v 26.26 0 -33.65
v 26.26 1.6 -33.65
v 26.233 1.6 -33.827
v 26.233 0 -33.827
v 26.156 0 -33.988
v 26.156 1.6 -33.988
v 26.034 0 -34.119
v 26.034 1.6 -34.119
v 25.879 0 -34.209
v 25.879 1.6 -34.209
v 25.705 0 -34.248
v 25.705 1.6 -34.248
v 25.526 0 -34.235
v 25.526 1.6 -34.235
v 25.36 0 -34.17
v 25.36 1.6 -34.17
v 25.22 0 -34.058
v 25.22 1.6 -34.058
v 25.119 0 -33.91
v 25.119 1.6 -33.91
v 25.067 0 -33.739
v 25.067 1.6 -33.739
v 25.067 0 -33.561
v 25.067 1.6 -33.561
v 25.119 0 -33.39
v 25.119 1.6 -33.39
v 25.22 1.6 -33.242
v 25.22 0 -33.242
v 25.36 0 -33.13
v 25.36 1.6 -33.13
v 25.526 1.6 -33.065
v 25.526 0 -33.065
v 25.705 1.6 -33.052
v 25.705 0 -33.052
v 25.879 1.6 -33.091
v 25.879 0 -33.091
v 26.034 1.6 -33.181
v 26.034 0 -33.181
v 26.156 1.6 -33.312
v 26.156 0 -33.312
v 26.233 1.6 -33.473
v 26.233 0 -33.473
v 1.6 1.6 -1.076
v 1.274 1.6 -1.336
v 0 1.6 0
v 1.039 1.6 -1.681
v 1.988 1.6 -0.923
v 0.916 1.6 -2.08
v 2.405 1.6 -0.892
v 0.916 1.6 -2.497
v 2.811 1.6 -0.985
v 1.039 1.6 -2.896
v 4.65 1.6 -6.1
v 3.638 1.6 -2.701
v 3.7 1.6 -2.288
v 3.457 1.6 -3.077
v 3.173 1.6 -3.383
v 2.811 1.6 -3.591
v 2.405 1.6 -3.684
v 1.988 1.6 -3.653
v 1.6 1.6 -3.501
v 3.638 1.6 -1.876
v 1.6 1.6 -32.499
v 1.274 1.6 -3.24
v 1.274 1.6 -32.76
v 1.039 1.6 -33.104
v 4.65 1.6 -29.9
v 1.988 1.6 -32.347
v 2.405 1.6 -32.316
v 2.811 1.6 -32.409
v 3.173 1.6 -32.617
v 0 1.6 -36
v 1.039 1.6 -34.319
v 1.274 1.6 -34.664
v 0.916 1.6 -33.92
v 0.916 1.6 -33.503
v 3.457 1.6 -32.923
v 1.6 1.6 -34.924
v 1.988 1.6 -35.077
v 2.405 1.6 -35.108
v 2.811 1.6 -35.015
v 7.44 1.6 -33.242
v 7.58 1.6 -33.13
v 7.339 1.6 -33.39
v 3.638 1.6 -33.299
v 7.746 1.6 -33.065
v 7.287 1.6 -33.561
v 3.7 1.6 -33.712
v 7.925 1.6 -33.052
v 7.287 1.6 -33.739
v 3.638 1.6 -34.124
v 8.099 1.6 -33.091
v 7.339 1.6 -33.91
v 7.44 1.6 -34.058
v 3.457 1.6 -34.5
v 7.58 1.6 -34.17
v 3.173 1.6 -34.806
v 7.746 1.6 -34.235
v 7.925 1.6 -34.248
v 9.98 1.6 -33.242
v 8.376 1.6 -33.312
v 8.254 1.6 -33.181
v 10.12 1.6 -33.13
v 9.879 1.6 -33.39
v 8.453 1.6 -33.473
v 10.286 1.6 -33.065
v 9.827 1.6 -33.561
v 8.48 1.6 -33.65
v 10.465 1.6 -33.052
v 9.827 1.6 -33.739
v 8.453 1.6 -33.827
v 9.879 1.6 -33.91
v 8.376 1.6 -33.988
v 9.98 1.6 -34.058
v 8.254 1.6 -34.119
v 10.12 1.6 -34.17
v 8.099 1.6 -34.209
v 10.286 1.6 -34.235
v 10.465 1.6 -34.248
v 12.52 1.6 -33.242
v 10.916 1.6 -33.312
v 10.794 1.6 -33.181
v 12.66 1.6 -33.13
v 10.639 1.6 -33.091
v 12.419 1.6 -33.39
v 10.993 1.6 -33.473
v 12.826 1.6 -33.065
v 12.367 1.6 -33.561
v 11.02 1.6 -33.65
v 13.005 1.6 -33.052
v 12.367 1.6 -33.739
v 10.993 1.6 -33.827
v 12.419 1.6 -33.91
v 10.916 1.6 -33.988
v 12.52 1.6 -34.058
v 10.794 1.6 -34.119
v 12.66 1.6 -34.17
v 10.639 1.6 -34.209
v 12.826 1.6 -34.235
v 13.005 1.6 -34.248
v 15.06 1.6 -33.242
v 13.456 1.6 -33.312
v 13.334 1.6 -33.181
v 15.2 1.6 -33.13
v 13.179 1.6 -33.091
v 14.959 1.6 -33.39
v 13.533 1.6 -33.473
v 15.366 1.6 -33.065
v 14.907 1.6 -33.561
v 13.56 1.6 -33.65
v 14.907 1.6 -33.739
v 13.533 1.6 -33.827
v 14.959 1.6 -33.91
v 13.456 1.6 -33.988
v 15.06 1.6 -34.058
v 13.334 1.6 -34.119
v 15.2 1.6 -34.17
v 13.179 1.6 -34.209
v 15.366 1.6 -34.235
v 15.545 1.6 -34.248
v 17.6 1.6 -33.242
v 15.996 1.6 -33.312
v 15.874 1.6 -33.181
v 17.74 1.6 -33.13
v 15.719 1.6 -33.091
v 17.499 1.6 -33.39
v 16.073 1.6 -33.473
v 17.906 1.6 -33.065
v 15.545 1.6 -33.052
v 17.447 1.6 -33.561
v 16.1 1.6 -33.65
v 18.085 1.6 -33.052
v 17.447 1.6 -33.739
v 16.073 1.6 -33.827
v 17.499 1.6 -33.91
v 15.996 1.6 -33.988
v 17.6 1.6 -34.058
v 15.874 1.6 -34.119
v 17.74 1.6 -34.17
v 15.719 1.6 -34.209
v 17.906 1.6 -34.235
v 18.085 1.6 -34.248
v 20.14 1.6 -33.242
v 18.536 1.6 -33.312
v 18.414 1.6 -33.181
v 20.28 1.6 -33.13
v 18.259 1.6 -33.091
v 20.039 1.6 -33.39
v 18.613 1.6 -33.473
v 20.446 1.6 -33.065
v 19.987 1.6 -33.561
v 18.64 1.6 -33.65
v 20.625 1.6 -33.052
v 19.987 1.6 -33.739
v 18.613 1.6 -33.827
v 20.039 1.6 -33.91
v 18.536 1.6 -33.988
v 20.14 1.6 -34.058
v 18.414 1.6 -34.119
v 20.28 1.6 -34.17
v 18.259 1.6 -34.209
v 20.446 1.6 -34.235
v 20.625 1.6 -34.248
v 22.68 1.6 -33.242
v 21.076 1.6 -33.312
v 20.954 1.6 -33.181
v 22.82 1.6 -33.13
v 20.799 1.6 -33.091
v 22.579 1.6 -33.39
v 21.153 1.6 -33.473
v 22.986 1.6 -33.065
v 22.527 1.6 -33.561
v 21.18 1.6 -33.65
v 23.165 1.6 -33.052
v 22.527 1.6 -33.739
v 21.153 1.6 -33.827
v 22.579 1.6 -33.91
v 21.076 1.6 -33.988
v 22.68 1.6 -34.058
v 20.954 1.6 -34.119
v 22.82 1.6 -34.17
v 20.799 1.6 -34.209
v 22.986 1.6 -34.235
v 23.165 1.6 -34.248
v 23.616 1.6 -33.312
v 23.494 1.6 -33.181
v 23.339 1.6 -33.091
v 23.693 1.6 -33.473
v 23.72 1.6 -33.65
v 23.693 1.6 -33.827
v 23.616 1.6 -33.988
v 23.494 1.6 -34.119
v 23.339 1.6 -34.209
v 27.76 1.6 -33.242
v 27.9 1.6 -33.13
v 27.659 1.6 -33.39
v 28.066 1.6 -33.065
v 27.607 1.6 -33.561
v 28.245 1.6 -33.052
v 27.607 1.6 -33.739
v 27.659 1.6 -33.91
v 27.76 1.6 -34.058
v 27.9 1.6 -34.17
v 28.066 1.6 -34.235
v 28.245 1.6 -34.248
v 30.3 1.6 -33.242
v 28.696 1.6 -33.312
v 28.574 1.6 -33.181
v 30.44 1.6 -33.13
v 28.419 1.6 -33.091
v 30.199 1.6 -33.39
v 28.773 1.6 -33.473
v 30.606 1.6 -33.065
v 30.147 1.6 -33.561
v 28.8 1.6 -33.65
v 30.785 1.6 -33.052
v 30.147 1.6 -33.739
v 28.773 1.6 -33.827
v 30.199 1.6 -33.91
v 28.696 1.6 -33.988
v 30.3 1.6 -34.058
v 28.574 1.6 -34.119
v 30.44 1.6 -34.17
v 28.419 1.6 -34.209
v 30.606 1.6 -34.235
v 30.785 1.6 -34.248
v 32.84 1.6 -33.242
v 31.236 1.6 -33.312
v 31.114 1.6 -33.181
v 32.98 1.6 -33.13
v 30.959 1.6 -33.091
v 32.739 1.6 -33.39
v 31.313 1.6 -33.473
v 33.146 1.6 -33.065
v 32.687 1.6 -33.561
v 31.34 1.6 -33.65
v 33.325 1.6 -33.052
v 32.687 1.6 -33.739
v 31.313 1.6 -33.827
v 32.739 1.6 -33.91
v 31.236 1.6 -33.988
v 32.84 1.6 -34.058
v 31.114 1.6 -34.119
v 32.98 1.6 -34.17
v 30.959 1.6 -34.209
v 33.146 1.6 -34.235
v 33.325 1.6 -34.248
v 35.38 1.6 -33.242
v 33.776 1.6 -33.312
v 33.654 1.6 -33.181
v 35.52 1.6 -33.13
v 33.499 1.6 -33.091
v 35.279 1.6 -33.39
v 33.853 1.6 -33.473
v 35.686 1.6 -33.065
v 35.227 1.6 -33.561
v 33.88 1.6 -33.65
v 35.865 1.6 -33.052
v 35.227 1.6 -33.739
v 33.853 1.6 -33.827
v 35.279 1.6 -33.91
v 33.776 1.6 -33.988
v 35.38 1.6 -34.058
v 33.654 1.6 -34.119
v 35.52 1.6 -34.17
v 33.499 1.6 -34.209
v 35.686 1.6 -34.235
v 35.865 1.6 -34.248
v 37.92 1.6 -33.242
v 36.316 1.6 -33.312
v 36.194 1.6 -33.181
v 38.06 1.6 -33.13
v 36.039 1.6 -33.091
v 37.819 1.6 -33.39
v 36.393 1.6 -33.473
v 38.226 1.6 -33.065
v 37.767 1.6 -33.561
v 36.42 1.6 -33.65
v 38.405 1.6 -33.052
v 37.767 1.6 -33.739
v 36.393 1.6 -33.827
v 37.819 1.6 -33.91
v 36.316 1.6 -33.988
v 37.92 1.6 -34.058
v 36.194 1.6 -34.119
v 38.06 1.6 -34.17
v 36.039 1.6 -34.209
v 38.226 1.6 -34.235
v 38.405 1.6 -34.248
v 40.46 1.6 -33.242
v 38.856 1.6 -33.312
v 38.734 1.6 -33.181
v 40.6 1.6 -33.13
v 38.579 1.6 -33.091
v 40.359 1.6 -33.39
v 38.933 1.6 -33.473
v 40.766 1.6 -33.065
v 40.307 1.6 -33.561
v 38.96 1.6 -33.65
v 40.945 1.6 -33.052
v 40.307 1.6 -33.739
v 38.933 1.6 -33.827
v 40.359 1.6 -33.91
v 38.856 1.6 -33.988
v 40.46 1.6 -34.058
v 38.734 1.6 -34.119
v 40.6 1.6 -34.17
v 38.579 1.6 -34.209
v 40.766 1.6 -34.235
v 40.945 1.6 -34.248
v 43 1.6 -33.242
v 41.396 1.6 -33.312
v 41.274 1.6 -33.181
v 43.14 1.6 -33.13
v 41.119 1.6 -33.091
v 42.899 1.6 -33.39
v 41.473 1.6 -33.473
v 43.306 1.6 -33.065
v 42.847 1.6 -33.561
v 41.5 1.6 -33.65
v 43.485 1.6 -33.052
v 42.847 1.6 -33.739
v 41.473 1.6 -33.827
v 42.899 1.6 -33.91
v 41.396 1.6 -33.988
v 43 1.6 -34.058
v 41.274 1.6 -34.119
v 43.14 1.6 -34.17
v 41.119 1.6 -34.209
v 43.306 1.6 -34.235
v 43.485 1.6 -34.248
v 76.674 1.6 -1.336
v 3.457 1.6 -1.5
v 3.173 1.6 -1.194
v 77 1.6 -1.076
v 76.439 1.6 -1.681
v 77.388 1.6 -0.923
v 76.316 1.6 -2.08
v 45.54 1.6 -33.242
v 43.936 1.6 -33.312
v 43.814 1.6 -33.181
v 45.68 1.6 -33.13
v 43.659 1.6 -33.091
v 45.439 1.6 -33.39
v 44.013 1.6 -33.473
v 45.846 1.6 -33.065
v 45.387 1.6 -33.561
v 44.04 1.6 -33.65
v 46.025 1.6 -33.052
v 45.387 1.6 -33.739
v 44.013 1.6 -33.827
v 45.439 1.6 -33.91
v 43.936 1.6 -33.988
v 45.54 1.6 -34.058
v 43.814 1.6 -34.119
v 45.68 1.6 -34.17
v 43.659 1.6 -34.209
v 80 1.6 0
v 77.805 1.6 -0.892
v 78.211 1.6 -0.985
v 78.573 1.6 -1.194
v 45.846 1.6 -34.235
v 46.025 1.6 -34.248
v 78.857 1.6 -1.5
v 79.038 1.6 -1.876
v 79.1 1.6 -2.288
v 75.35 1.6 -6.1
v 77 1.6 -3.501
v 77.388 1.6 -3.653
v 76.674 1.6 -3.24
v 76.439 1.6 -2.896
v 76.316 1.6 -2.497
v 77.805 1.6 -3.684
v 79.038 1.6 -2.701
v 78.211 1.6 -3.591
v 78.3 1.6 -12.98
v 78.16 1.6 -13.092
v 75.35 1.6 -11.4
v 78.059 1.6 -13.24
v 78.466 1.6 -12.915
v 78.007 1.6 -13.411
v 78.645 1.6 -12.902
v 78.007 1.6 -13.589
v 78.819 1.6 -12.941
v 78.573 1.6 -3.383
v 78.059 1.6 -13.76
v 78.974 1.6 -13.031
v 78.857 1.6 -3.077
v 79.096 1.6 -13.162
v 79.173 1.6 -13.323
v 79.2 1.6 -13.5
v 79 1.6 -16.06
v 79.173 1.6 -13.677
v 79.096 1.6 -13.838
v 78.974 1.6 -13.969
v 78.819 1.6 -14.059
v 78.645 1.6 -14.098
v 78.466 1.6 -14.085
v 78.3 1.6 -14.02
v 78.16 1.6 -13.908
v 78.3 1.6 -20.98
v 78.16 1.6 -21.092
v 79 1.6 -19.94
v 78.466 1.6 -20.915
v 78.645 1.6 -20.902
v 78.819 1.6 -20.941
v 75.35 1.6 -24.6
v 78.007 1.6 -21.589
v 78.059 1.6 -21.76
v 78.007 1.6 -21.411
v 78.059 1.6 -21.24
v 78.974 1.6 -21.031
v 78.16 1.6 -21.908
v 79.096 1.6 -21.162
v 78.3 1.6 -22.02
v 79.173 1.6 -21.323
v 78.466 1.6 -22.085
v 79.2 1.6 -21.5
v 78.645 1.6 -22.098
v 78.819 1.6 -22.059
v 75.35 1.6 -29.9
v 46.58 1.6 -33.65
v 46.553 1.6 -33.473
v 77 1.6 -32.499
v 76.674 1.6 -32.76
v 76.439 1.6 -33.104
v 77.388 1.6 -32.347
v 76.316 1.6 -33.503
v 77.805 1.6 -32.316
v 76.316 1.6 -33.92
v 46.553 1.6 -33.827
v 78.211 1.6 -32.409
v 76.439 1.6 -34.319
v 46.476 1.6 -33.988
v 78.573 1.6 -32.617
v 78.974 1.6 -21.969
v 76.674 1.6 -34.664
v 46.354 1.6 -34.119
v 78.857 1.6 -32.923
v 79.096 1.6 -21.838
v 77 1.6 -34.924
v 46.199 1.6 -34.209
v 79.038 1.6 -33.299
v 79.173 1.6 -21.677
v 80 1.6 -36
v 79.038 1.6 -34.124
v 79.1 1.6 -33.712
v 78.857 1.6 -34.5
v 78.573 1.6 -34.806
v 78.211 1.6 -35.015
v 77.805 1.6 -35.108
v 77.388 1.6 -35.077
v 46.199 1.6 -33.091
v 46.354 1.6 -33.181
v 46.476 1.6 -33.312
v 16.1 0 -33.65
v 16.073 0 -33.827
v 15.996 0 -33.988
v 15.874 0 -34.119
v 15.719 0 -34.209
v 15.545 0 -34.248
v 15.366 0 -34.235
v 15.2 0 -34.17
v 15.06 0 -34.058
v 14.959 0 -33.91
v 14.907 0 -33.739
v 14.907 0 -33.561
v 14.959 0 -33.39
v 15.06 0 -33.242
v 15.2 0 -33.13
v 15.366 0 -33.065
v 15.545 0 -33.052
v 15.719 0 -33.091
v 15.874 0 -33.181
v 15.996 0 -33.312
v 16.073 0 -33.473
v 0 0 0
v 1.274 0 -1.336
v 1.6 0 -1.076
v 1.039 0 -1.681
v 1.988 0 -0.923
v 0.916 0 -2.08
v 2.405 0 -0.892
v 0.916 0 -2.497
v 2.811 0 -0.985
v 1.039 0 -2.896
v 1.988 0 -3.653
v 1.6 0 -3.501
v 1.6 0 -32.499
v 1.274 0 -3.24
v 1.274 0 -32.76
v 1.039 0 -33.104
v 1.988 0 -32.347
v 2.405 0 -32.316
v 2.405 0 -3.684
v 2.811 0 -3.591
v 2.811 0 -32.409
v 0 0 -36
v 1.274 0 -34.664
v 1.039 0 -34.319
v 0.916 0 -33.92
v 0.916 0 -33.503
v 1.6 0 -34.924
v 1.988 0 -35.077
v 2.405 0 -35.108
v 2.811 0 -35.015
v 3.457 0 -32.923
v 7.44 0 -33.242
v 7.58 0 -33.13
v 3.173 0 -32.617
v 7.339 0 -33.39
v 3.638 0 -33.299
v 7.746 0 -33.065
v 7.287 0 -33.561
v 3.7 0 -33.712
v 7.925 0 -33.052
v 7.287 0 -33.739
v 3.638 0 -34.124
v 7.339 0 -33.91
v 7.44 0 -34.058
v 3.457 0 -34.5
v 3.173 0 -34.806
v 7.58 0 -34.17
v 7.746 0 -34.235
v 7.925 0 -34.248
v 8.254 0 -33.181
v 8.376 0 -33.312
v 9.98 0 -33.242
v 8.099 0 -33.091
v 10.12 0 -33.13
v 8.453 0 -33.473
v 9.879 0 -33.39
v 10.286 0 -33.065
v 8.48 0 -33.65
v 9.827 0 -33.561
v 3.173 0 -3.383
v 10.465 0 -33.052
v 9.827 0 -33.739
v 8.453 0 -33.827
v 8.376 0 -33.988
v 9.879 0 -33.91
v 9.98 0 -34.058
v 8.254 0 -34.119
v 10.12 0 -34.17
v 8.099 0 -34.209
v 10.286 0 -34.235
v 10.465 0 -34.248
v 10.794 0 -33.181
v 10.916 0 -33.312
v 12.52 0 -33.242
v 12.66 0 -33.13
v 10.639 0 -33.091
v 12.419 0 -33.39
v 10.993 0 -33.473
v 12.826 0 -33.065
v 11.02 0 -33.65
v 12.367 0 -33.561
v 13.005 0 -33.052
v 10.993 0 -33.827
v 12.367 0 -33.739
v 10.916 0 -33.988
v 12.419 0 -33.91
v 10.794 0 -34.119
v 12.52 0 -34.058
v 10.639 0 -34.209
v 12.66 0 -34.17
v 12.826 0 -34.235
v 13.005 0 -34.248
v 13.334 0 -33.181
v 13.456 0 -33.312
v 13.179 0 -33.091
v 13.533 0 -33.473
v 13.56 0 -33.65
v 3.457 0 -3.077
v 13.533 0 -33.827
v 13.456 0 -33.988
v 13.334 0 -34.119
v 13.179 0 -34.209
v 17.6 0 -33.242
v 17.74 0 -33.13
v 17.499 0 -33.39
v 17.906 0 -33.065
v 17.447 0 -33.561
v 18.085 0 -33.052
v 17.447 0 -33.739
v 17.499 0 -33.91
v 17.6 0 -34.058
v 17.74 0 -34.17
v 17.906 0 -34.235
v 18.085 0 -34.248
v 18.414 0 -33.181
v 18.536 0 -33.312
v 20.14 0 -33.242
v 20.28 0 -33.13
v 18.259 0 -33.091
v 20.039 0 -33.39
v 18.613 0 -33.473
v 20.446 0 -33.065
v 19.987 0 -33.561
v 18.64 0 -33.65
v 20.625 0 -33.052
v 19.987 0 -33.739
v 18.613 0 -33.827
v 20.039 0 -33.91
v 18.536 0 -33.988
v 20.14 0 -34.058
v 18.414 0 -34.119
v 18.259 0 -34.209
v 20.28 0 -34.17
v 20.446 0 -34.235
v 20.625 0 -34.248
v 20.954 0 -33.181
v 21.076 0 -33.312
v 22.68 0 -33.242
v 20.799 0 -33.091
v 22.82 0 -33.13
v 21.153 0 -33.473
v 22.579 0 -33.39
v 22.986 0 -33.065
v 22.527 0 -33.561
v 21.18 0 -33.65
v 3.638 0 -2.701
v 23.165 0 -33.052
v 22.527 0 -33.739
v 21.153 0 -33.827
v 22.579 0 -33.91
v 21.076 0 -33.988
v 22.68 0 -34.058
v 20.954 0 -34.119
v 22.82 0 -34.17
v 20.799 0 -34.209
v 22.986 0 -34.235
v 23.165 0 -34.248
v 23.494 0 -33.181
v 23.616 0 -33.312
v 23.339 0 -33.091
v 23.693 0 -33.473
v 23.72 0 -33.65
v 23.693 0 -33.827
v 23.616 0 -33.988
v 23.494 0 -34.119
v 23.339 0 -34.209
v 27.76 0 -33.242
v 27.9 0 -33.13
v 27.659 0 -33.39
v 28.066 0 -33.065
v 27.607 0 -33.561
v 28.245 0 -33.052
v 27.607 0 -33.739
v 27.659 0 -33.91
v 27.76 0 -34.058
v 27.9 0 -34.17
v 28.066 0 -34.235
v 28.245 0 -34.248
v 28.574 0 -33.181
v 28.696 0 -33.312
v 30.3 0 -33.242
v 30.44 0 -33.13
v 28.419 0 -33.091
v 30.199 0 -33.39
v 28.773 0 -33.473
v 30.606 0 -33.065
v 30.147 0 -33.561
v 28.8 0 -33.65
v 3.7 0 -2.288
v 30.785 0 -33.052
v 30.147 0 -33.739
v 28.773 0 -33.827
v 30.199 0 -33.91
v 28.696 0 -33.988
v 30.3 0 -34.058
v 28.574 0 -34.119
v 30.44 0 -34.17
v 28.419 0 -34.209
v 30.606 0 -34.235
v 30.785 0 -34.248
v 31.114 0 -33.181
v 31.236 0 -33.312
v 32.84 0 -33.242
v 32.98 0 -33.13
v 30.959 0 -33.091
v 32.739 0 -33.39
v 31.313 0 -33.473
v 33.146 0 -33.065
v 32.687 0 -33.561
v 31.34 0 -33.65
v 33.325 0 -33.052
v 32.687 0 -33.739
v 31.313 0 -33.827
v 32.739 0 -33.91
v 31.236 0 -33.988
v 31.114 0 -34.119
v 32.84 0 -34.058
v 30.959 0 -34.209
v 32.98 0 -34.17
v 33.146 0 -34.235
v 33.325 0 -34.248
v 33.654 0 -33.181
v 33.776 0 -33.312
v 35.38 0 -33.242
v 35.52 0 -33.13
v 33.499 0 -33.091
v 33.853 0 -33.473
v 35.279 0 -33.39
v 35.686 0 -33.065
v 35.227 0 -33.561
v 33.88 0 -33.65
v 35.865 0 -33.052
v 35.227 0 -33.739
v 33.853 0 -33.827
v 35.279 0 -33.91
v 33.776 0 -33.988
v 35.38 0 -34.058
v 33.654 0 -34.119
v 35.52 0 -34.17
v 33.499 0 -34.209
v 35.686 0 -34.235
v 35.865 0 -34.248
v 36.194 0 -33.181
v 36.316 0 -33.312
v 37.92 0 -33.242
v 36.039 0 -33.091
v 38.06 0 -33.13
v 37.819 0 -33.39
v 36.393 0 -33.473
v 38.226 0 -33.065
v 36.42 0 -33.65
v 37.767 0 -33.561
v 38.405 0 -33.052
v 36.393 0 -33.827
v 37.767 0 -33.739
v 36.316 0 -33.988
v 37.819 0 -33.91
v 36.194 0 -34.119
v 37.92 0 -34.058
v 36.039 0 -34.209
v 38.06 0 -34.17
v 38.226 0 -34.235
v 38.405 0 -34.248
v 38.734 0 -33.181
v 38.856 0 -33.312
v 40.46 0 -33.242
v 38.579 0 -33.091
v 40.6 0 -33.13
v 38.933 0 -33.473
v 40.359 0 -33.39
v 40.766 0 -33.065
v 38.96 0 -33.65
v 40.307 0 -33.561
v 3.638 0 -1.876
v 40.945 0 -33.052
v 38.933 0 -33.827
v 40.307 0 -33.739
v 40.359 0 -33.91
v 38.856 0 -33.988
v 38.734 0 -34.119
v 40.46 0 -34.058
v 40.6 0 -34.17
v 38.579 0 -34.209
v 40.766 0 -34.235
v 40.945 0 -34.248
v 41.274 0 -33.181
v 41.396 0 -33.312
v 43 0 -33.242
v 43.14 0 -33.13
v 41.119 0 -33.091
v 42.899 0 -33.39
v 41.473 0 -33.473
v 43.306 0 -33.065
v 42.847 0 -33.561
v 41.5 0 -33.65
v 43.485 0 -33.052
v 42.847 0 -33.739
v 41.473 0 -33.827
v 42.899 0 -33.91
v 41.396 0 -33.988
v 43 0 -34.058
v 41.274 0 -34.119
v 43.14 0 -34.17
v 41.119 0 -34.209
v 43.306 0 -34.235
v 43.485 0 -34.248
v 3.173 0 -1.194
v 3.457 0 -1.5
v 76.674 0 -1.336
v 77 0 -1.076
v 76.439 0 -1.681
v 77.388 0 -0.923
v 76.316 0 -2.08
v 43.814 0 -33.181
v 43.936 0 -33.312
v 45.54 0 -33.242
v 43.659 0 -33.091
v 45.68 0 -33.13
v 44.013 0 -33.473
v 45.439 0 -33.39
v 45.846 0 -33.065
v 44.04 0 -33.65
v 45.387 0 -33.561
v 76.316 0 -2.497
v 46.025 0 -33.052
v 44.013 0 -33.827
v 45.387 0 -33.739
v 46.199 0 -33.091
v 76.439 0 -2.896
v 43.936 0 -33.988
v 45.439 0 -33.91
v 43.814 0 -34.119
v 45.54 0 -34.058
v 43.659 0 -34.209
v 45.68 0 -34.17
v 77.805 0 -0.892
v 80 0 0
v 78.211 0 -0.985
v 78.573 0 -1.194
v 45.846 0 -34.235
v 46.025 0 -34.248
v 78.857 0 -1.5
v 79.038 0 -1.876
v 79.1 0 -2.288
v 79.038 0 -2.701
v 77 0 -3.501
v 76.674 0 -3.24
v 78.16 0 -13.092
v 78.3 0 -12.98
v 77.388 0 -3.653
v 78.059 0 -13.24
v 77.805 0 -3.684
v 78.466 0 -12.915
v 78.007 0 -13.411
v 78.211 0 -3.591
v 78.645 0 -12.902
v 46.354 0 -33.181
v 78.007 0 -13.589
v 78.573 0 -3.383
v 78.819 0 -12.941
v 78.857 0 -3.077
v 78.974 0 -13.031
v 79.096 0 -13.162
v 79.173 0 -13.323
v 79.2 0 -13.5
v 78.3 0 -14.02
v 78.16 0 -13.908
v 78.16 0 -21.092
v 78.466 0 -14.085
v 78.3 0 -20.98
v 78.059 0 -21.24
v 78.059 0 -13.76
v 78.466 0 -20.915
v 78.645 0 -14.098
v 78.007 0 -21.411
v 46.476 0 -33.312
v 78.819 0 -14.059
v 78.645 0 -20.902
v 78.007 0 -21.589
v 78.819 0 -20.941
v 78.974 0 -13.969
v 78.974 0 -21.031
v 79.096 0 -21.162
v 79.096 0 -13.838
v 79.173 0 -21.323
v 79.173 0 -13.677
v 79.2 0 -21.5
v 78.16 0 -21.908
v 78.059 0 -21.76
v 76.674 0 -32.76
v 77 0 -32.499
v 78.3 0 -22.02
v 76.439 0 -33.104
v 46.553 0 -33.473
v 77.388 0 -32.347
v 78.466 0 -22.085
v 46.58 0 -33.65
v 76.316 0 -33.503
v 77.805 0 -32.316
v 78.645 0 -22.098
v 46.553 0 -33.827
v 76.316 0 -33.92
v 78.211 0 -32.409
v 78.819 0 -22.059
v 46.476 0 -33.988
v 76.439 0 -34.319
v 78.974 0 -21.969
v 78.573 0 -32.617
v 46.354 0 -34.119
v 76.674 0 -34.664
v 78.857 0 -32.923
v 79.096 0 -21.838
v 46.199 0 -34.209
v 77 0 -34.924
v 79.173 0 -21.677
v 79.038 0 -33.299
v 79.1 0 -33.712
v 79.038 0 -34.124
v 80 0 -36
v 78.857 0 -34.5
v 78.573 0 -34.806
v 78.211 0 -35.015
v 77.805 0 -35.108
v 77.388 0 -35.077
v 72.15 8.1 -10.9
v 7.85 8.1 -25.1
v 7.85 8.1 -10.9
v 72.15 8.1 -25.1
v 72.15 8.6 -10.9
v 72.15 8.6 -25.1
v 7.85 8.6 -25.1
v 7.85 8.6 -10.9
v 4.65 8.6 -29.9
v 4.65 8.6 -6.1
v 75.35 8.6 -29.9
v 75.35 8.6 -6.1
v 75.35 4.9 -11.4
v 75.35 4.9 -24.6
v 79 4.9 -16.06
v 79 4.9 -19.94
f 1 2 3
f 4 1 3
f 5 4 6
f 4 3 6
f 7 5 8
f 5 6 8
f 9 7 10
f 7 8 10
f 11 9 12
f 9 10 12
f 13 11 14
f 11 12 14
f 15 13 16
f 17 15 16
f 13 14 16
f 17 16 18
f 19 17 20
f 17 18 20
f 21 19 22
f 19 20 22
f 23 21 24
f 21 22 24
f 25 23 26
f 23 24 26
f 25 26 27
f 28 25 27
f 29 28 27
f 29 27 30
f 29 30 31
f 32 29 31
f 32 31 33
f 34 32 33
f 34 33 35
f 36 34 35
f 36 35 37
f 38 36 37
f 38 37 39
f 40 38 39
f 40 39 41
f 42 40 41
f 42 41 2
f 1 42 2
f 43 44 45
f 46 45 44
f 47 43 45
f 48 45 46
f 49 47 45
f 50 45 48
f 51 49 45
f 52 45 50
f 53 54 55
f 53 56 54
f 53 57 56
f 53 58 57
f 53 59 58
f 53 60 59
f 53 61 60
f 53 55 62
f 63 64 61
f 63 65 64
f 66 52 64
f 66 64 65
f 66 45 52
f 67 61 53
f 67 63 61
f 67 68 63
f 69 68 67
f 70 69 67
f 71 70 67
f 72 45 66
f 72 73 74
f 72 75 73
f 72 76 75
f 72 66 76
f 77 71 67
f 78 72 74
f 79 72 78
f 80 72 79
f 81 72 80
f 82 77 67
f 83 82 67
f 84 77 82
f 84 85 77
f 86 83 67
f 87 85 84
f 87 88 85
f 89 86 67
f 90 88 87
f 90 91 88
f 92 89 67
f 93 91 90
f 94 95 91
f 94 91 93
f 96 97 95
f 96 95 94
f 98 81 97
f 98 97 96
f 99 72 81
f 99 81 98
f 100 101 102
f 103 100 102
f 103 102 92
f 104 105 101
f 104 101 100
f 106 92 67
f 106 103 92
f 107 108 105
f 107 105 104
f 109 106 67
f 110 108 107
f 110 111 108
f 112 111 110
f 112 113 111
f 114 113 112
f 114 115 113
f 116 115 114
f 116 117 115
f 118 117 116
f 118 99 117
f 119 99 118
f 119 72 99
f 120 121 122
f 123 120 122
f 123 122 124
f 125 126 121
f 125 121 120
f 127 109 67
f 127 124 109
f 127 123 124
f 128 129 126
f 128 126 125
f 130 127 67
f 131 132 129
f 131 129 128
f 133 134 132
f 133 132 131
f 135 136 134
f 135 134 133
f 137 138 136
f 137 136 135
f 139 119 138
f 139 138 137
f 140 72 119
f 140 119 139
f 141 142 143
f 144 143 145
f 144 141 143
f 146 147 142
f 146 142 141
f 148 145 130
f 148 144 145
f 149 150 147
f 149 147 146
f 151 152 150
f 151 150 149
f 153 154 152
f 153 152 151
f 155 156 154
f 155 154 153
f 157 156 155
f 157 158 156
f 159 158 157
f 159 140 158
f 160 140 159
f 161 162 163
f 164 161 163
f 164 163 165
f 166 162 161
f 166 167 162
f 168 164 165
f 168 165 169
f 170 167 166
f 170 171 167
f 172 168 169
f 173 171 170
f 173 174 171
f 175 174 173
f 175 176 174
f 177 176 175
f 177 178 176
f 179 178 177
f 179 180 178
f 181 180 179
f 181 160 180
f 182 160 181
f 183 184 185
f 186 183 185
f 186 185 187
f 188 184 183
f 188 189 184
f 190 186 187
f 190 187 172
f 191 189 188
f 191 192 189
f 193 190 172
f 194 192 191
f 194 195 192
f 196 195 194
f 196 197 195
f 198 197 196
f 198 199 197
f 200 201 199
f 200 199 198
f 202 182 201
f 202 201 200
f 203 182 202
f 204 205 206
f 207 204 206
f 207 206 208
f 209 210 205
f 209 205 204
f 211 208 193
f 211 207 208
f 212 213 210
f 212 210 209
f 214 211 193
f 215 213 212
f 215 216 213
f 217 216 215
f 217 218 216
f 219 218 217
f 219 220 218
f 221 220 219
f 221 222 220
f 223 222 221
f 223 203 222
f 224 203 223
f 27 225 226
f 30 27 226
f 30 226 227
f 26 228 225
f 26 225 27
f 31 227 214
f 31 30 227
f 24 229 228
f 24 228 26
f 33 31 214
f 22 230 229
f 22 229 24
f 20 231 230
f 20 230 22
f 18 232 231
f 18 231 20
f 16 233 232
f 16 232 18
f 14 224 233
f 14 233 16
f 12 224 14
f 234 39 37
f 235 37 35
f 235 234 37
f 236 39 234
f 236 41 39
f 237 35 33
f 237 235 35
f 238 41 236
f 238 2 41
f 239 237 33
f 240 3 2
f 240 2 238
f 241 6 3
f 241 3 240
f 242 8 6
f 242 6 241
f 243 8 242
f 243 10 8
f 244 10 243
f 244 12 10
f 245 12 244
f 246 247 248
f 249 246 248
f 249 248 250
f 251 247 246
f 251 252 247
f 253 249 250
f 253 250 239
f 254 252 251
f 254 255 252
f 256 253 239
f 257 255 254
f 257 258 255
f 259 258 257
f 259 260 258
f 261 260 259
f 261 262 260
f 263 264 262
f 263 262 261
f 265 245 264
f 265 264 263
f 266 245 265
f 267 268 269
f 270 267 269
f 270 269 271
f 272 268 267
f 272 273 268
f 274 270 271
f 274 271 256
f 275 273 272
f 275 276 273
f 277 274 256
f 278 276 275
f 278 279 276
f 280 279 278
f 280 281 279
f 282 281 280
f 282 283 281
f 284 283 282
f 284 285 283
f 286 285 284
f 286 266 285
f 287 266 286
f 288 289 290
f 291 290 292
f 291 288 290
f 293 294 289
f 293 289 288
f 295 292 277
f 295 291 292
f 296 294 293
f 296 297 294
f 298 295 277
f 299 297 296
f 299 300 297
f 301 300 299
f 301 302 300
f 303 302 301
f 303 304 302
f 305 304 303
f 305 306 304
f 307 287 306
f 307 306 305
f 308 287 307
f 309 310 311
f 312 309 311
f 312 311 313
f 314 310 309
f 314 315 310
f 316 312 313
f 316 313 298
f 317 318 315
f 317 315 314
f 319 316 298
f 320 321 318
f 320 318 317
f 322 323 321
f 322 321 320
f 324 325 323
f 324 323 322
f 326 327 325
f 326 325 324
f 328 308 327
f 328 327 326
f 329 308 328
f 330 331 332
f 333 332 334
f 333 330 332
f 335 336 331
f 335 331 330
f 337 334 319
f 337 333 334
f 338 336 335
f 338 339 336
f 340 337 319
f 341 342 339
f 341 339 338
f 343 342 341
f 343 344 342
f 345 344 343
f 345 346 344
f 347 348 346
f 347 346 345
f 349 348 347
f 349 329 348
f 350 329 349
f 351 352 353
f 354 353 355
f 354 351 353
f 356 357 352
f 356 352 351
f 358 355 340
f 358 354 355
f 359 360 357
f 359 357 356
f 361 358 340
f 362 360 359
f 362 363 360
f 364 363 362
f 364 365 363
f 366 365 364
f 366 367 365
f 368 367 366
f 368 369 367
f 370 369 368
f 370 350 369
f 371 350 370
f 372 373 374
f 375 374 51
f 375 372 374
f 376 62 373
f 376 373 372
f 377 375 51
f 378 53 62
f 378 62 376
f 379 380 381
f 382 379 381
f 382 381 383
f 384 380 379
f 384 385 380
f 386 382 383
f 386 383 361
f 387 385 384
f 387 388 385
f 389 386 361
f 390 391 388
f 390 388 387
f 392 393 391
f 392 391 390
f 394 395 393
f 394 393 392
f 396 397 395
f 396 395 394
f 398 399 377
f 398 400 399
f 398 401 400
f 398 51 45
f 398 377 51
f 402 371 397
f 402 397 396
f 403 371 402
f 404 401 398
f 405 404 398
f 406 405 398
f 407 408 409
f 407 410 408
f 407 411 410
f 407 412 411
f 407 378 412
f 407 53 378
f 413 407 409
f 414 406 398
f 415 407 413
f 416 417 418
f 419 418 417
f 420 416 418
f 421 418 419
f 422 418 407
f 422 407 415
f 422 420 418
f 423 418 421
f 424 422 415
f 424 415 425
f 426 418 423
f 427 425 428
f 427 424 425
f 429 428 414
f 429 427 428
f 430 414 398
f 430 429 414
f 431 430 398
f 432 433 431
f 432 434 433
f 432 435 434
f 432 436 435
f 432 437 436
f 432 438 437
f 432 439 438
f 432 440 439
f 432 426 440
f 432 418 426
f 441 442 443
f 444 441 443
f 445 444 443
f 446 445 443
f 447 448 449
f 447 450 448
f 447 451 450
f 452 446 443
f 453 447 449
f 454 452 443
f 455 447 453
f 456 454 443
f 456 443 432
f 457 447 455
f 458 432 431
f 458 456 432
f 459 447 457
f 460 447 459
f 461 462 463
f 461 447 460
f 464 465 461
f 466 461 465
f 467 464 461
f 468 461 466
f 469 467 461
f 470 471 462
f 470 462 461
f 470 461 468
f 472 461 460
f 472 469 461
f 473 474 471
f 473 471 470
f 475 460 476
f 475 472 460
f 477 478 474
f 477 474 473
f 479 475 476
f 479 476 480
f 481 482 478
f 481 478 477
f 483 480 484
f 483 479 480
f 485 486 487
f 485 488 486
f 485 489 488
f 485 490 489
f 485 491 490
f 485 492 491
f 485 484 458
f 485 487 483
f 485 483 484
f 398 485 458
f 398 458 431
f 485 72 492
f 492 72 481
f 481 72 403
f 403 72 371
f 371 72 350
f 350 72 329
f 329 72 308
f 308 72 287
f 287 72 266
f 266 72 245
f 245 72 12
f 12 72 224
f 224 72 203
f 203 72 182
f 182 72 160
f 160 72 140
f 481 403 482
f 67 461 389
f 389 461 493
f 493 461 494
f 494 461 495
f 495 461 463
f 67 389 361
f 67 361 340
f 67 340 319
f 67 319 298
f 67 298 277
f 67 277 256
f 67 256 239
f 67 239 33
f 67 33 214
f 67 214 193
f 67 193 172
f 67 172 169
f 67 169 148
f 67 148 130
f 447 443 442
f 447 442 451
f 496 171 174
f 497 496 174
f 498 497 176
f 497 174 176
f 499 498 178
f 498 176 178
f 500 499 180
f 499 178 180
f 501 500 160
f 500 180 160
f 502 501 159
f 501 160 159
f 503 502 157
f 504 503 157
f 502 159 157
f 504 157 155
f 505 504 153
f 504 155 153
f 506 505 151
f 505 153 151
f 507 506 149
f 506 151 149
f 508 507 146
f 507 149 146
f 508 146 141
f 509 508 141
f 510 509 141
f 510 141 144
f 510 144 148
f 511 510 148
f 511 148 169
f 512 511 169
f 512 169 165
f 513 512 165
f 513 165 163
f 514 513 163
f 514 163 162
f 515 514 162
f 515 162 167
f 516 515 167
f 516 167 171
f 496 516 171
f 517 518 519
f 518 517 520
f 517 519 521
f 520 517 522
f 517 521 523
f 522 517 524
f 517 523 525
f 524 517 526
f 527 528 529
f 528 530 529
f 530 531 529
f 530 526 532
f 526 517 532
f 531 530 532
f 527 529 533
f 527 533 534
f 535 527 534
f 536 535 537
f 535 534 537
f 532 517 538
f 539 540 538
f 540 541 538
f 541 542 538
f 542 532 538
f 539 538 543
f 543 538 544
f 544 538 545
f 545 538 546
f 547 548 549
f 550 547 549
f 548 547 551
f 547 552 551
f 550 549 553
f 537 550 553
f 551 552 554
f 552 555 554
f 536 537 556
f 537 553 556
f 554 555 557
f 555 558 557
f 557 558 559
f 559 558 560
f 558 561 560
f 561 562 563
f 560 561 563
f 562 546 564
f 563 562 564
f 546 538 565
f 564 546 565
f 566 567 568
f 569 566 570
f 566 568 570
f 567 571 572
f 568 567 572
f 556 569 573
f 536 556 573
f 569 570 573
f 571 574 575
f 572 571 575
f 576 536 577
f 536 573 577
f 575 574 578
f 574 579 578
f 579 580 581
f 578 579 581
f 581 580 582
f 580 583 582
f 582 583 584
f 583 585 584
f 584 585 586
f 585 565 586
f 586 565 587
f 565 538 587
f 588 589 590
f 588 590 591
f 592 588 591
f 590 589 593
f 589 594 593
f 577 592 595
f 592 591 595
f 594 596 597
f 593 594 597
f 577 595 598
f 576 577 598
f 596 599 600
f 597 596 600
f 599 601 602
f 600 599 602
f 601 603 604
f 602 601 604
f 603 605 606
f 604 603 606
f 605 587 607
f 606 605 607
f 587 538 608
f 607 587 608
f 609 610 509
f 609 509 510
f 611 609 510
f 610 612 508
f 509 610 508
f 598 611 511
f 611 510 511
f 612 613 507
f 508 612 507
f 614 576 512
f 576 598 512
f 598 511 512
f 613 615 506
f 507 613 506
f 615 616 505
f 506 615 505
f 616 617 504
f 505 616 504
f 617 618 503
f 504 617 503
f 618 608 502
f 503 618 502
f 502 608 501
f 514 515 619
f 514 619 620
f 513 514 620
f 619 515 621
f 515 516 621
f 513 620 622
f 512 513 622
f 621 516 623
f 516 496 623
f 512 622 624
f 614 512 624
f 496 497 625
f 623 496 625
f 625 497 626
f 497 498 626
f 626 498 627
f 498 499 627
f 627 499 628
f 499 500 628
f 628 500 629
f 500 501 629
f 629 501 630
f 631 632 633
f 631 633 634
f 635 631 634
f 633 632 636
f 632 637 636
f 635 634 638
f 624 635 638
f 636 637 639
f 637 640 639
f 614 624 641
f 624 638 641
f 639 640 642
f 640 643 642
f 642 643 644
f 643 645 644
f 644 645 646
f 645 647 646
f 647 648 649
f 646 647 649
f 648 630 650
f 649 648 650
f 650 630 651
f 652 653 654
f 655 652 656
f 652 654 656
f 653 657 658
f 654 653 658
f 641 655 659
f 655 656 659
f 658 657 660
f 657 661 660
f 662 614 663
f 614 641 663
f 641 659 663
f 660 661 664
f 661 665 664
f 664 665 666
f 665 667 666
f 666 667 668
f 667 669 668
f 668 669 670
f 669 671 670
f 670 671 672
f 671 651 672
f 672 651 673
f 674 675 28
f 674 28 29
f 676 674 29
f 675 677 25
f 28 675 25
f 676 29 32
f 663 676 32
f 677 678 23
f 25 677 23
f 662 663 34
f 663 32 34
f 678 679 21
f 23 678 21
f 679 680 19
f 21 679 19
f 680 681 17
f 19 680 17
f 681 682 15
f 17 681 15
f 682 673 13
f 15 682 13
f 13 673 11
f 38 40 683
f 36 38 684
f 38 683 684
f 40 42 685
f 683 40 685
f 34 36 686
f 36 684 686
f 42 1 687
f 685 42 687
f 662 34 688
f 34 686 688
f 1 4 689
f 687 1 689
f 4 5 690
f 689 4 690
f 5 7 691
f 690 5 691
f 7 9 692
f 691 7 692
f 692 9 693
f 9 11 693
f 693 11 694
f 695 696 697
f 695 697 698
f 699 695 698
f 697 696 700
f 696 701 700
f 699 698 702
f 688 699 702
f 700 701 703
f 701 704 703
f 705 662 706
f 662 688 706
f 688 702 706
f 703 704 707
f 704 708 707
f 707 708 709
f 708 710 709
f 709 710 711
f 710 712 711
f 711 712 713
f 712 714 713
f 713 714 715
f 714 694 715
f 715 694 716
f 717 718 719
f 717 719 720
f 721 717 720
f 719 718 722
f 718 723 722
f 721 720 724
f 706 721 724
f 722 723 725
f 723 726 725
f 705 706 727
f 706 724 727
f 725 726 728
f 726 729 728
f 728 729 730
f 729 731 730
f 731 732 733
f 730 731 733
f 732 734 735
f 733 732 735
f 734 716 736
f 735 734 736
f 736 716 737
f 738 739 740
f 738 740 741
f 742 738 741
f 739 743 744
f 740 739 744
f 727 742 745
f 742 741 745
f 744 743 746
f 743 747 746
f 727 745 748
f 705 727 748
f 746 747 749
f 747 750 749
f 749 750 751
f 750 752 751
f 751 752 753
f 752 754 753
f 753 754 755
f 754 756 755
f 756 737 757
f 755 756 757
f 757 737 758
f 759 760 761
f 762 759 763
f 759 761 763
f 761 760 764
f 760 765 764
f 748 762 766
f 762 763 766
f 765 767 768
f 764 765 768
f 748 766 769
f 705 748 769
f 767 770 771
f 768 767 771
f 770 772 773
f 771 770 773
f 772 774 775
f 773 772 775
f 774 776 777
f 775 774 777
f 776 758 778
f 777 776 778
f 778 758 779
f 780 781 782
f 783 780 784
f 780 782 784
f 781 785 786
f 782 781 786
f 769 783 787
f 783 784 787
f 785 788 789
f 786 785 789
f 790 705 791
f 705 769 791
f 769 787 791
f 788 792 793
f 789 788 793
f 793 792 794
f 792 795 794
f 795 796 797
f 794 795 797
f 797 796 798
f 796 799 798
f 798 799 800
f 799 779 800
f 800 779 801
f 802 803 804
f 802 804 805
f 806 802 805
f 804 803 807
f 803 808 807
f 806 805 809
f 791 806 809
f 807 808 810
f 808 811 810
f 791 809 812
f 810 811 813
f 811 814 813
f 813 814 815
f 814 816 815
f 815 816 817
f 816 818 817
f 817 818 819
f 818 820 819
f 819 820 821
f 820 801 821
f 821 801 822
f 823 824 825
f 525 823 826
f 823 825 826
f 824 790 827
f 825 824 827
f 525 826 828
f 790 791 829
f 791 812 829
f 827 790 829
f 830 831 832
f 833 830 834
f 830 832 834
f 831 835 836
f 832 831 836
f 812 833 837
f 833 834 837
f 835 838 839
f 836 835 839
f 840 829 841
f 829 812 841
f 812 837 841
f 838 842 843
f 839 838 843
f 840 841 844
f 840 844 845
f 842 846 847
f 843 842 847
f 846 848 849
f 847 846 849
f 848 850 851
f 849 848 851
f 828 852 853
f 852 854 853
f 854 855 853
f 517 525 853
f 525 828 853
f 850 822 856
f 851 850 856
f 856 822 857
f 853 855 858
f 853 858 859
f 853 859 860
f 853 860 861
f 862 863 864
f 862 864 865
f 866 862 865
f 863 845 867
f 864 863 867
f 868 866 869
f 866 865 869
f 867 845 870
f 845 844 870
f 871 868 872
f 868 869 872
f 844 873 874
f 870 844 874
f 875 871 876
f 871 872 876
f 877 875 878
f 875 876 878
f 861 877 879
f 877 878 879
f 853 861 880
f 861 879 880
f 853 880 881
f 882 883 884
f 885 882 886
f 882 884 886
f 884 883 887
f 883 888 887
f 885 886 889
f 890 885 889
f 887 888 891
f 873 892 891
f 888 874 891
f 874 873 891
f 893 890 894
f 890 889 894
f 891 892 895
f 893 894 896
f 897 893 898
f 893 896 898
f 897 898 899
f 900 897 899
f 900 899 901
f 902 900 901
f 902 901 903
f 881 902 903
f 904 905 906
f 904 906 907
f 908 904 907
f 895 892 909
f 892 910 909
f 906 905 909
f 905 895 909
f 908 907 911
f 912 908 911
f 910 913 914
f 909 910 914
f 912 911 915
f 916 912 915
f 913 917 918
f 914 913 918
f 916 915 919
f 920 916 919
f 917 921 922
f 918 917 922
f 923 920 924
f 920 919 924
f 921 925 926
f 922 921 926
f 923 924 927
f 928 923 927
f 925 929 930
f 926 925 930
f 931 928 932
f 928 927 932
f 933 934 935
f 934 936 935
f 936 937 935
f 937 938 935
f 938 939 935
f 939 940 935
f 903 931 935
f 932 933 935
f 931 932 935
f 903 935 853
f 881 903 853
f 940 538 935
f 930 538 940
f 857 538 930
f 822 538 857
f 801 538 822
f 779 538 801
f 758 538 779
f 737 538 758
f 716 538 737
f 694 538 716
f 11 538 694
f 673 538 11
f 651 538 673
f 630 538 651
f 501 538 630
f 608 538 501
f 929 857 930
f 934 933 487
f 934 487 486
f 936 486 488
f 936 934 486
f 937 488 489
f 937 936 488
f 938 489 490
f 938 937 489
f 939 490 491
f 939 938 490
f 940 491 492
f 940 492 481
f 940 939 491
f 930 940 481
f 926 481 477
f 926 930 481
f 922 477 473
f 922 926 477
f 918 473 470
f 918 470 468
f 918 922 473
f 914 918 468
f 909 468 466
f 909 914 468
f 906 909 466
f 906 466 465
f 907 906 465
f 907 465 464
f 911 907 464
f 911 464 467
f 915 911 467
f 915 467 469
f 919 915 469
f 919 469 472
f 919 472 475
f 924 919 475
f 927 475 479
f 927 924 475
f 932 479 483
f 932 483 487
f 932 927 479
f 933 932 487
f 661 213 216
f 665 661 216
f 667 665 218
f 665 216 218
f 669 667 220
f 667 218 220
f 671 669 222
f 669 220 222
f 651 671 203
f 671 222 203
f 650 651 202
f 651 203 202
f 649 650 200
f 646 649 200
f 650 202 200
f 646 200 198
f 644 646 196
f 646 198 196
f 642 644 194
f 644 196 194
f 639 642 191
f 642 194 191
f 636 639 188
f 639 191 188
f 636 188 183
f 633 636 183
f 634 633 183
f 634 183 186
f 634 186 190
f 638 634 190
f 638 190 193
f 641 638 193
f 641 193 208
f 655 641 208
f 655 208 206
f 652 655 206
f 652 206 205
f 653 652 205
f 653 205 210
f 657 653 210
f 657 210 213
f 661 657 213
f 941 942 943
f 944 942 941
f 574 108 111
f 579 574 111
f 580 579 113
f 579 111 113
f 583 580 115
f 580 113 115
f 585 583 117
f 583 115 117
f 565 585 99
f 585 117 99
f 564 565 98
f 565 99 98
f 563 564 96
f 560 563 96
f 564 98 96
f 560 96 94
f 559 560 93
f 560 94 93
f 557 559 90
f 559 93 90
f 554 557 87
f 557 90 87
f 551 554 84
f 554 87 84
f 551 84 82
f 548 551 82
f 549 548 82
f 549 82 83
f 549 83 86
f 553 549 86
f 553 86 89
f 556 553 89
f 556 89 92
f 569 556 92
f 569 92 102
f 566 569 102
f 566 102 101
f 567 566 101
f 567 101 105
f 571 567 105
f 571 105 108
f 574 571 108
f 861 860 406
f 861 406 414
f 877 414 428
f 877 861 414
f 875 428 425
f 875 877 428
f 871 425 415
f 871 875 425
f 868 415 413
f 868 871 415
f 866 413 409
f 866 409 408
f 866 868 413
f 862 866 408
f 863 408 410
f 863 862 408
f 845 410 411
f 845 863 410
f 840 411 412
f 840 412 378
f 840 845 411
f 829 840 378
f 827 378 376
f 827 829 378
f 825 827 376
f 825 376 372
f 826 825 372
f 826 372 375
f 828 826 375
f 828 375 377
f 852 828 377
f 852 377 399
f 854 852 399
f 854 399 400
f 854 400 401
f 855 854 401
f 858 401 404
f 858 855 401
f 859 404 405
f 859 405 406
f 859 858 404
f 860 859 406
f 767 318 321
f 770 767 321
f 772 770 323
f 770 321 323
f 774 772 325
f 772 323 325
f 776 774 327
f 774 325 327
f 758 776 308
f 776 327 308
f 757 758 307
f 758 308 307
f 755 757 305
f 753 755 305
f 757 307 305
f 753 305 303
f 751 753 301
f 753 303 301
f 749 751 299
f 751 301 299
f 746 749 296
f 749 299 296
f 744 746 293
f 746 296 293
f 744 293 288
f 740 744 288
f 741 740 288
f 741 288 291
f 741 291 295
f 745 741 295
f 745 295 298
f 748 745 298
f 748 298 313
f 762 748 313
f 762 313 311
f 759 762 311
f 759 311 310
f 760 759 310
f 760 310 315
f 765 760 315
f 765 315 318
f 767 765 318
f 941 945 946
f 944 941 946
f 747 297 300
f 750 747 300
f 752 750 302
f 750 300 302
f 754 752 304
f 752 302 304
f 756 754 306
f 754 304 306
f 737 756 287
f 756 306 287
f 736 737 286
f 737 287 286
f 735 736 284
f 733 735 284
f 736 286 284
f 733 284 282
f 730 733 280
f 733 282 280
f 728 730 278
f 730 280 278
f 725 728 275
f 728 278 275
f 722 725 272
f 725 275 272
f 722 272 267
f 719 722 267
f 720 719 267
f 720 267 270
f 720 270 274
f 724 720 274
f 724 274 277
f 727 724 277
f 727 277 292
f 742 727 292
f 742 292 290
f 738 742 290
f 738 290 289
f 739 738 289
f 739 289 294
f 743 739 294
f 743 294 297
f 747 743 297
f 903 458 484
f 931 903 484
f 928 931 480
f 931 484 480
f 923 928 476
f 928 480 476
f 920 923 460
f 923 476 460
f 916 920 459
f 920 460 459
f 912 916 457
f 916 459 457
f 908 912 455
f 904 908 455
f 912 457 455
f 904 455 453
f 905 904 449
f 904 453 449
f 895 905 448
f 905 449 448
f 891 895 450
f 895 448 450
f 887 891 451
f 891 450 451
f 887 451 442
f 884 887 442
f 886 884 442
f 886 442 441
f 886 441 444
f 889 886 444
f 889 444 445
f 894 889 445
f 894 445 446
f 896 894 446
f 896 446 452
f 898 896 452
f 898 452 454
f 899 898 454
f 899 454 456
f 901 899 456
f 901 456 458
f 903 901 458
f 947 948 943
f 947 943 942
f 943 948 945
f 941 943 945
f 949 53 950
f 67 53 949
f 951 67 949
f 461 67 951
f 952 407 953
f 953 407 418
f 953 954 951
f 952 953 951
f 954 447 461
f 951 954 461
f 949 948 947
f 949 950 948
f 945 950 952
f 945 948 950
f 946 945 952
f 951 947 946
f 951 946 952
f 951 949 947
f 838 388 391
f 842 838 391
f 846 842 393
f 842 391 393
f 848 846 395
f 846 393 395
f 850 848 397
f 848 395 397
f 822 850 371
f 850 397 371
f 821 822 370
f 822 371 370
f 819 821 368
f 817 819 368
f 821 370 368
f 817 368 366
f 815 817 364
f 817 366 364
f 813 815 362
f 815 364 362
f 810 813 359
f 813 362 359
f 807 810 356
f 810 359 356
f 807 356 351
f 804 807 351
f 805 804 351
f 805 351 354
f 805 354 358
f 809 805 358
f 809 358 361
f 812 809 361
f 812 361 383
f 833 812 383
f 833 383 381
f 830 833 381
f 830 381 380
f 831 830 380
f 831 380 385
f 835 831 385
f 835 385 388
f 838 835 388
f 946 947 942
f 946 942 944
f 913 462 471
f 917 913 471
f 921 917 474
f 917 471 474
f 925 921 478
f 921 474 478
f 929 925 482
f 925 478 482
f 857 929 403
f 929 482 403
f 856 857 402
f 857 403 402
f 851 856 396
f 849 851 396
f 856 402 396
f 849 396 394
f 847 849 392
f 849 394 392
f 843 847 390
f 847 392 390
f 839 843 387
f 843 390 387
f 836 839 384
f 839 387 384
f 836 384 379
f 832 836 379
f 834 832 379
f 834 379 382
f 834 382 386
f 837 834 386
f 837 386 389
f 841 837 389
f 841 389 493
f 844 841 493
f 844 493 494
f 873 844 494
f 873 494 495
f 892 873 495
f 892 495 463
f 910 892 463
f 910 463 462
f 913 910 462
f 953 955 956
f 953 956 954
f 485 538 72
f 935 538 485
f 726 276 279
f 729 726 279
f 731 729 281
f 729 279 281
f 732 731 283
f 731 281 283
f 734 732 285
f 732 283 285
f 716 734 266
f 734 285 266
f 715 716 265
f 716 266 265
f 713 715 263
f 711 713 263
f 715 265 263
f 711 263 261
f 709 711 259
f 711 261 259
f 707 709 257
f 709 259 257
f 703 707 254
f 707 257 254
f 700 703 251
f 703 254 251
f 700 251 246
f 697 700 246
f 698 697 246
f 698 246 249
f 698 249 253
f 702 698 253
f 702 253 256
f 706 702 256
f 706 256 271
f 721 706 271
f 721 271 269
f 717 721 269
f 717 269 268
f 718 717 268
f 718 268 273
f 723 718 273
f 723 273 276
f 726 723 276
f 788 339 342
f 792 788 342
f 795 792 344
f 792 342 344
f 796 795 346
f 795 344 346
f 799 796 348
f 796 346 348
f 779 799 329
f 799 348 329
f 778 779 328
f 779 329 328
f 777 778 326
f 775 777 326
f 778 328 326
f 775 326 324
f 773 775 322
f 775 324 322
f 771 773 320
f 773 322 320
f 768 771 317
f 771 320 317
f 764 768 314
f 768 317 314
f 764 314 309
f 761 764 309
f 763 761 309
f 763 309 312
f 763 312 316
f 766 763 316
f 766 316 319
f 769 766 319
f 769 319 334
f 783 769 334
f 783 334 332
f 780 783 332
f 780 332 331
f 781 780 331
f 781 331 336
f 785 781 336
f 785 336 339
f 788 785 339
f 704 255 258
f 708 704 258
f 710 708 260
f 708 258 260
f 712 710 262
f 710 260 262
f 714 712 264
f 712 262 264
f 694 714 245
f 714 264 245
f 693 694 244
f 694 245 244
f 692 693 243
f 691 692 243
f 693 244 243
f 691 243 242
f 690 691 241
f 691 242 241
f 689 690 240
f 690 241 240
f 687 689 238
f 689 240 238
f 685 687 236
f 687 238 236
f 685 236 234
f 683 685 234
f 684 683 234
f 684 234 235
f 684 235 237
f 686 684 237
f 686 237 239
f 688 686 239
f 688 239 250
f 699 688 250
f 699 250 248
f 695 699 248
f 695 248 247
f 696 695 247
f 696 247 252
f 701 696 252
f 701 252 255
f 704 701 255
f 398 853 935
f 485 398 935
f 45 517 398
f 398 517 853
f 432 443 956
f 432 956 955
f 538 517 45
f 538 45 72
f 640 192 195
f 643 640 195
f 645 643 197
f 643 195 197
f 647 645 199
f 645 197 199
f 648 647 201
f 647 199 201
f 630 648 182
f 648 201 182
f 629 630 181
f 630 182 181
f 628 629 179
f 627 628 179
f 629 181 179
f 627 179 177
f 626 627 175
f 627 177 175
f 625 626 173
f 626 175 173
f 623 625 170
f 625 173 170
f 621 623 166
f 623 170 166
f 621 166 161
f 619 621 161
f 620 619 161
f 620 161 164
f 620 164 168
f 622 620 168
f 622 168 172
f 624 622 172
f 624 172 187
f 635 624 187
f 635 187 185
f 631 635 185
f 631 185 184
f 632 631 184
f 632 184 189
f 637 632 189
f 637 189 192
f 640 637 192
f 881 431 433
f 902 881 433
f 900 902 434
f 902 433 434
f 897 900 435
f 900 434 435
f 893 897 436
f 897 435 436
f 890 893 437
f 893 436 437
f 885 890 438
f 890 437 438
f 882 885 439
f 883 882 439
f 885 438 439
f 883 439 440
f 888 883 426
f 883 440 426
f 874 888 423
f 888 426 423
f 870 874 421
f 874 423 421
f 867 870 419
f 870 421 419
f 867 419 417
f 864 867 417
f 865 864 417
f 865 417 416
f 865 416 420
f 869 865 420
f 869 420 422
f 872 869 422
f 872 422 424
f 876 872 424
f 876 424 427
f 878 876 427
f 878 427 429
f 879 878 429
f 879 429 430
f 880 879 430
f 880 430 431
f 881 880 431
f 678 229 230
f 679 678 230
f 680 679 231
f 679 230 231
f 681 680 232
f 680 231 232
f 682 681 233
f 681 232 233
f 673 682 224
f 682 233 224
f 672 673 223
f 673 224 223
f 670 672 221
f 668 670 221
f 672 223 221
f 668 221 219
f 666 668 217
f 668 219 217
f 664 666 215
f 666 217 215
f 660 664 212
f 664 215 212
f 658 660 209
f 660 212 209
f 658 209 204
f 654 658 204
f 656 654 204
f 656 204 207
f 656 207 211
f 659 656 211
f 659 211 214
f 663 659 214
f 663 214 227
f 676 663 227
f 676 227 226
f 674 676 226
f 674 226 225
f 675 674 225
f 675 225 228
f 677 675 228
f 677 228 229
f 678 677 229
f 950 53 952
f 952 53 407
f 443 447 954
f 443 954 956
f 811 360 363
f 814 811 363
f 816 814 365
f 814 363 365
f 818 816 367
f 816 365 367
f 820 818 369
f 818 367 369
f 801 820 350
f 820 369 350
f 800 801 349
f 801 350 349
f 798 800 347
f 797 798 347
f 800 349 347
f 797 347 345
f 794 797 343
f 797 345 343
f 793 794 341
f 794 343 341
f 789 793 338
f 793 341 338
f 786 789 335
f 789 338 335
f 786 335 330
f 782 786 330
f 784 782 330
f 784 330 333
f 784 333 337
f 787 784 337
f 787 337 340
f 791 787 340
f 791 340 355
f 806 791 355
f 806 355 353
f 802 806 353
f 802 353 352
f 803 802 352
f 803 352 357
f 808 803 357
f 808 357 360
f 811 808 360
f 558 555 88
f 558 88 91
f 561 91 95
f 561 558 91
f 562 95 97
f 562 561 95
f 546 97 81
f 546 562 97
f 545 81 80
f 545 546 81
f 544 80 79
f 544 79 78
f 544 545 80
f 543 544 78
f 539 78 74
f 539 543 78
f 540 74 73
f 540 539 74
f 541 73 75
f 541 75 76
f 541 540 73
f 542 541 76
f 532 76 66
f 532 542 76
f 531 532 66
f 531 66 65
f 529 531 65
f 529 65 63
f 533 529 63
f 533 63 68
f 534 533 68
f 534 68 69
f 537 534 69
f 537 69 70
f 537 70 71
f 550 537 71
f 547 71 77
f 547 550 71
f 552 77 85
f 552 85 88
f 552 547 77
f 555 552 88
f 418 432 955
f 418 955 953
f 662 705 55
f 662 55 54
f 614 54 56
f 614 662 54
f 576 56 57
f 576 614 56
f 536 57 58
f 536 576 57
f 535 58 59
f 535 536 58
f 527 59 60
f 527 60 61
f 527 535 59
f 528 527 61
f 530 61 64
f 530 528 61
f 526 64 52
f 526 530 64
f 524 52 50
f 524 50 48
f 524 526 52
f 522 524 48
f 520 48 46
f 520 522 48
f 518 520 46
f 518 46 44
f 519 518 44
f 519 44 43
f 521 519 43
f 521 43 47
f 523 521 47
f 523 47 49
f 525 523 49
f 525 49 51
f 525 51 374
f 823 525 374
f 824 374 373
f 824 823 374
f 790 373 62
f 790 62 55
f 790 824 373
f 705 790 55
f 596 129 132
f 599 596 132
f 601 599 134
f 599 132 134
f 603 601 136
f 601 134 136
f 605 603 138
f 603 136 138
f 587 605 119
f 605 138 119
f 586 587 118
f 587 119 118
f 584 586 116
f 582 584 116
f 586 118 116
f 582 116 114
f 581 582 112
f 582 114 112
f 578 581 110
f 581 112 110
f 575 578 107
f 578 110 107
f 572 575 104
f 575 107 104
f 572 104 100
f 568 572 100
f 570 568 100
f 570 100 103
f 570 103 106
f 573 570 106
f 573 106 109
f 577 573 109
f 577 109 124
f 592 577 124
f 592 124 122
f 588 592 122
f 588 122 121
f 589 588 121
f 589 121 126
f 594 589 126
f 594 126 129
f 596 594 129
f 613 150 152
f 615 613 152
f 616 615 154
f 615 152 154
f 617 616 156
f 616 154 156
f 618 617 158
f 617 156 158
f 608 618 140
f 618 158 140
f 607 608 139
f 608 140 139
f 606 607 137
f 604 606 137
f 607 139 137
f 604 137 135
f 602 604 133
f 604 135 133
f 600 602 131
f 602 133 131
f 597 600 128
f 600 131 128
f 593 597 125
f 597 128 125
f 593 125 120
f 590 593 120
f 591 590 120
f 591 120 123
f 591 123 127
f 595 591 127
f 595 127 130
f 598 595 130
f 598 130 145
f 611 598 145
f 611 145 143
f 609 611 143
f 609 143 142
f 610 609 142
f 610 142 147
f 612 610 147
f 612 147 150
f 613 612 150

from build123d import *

# Parameters (mm, degrees)
SKETCH1_W           = 80
SKETCH1_H           = 36
SKETCH1_R           = 1.4
BOSS_EXTRUDE1_DEPTH = 1.6
SKETCH2_W           = 70.7
SKETCH2_H           = 23.8
BOSS_EXTRUDE2_DEPTH = 7
SKETCH3_W           = 64.3
SKETCH3_H           = 14.2
CUT_EXTRUDE1_DEPTH  = 0.5
BOSS_EXTRUDE3_DEPTH = 3.3
SKETCH5_R           = 0.6
CUT_EXTRUDE2_DEPTH  = 2.6


with BuildPart() as part:
    # Sketch1 → Boss-Extrude1 (new body)
    with BuildSketch(Plane(origin=(0, 0, 0), x_dir=(1, 0, 0), z_dir=(0, 1, 0))):
        with Locations((40, 18)):
            Rectangle(SKETCH1_W, SKETCH1_H)
        with Locations((2.3, 33.711820065)):
            Circle(SKETCH1_R, mode=Mode.SUBTRACT)
        with Locations((2.3, 2.288179935)):
            Circle(SKETCH1_R, mode=Mode.SUBTRACT)
        with Locations((77.7, 2.288179935)):
            Circle(SKETCH1_R, mode=Mode.SUBTRACT)
        with Locations((77.7, 33.711820065)):
            Circle(SKETCH1_R, mode=Mode.SUBTRACT)
    extrude(amount=BOSS_EXTRUDE1_DEPTH)

    # Sketch2 → Boss-Extrude2 (add)
    with BuildSketch(Plane(origin=(0, 1.6, 0), x_dir=(1, 0, 0), z_dir=(0, 1, 0))):
        with Locations((40, 18)):
            Rectangle(SKETCH2_W, SKETCH2_H)
    extrude(amount=BOSS_EXTRUDE2_DEPTH)

    # Sketch3 → Cut-Extrude1 (cut)
    with BuildSketch(Plane(origin=(0, 8.6, 0), x_dir=(1, 0, 0), z_dir=(0, 1, 0))):
        with Locations((40, 18)):
            Rectangle(SKETCH3_W, SKETCH3_H)
    extrude(amount=-CUT_EXTRUDE1_DEPTH, mode=Mode.SUBTRACT)

    # Sketch4 → Boss-Extrude3 (add)
    with BuildSketch(Plane(origin=(0, 1.6, 0), x_dir=(1, 0, 0), z_dir=(0, 1, 0))):
        Polygon((75.35, 24.6), (79, 19.94), (79, 16.06), (75.35, 11.4), align=None)
    extrude(amount=BOSS_EXTRUDE3_DEPTH)

    # Sketch5 → Cut-Extrude2 (cut, through all)
    with BuildSketch(Plane(origin=(0, 1.6, 0), x_dir=(1, 0, 0), z_dir=(0, 1, 0))):
        with Locations((7.88, 33.65)):
            Circle(SKETCH5_R)
        with Locations((10.42, 33.65)):
            Circle(SKETCH5_R)
        with Locations((12.96, 33.65)):
            Circle(SKETCH5_R)
        with Locations((15.5, 33.65)):
            Circle(SKETCH5_R)
        with Locations((18.04, 33.65)):
            Circle(SKETCH5_R)
        with Locations((20.58, 33.65)):
            Circle(SKETCH5_R)
        with Locations((23.12, 33.65)):
            Circle(SKETCH5_R)
        with Locations((25.66, 33.65)):
            Circle(SKETCH5_R)
        with Locations((28.2, 33.65)):
            Circle(SKETCH5_R)
        with Locations((30.74, 33.65)):
            Circle(SKETCH5_R)
        with Locations((33.28, 33.65)):
            Circle(SKETCH5_R)
        with Locations((35.82, 33.65)):
            Circle(SKETCH5_R)
        with Locations((38.36, 33.65)):
            Circle(SKETCH5_R)
        with Locations((40.9, 33.65)):
            Circle(SKETCH5_R)
        with Locations((43.44, 33.65)):
            Circle(SKETCH5_R)
        with Locations((45.98, 33.65)):
            Circle(SKETCH5_R)
        with Locations((78.6, 21.5)):
            Circle(SKETCH5_R)
        with Locations((78.6, 13.5)):
            Circle(SKETCH5_R)
    extrude(amount=-CUT_EXTRUDE2_DEPTH, mode=Mode.SUBTRACT)


solid = part.part
